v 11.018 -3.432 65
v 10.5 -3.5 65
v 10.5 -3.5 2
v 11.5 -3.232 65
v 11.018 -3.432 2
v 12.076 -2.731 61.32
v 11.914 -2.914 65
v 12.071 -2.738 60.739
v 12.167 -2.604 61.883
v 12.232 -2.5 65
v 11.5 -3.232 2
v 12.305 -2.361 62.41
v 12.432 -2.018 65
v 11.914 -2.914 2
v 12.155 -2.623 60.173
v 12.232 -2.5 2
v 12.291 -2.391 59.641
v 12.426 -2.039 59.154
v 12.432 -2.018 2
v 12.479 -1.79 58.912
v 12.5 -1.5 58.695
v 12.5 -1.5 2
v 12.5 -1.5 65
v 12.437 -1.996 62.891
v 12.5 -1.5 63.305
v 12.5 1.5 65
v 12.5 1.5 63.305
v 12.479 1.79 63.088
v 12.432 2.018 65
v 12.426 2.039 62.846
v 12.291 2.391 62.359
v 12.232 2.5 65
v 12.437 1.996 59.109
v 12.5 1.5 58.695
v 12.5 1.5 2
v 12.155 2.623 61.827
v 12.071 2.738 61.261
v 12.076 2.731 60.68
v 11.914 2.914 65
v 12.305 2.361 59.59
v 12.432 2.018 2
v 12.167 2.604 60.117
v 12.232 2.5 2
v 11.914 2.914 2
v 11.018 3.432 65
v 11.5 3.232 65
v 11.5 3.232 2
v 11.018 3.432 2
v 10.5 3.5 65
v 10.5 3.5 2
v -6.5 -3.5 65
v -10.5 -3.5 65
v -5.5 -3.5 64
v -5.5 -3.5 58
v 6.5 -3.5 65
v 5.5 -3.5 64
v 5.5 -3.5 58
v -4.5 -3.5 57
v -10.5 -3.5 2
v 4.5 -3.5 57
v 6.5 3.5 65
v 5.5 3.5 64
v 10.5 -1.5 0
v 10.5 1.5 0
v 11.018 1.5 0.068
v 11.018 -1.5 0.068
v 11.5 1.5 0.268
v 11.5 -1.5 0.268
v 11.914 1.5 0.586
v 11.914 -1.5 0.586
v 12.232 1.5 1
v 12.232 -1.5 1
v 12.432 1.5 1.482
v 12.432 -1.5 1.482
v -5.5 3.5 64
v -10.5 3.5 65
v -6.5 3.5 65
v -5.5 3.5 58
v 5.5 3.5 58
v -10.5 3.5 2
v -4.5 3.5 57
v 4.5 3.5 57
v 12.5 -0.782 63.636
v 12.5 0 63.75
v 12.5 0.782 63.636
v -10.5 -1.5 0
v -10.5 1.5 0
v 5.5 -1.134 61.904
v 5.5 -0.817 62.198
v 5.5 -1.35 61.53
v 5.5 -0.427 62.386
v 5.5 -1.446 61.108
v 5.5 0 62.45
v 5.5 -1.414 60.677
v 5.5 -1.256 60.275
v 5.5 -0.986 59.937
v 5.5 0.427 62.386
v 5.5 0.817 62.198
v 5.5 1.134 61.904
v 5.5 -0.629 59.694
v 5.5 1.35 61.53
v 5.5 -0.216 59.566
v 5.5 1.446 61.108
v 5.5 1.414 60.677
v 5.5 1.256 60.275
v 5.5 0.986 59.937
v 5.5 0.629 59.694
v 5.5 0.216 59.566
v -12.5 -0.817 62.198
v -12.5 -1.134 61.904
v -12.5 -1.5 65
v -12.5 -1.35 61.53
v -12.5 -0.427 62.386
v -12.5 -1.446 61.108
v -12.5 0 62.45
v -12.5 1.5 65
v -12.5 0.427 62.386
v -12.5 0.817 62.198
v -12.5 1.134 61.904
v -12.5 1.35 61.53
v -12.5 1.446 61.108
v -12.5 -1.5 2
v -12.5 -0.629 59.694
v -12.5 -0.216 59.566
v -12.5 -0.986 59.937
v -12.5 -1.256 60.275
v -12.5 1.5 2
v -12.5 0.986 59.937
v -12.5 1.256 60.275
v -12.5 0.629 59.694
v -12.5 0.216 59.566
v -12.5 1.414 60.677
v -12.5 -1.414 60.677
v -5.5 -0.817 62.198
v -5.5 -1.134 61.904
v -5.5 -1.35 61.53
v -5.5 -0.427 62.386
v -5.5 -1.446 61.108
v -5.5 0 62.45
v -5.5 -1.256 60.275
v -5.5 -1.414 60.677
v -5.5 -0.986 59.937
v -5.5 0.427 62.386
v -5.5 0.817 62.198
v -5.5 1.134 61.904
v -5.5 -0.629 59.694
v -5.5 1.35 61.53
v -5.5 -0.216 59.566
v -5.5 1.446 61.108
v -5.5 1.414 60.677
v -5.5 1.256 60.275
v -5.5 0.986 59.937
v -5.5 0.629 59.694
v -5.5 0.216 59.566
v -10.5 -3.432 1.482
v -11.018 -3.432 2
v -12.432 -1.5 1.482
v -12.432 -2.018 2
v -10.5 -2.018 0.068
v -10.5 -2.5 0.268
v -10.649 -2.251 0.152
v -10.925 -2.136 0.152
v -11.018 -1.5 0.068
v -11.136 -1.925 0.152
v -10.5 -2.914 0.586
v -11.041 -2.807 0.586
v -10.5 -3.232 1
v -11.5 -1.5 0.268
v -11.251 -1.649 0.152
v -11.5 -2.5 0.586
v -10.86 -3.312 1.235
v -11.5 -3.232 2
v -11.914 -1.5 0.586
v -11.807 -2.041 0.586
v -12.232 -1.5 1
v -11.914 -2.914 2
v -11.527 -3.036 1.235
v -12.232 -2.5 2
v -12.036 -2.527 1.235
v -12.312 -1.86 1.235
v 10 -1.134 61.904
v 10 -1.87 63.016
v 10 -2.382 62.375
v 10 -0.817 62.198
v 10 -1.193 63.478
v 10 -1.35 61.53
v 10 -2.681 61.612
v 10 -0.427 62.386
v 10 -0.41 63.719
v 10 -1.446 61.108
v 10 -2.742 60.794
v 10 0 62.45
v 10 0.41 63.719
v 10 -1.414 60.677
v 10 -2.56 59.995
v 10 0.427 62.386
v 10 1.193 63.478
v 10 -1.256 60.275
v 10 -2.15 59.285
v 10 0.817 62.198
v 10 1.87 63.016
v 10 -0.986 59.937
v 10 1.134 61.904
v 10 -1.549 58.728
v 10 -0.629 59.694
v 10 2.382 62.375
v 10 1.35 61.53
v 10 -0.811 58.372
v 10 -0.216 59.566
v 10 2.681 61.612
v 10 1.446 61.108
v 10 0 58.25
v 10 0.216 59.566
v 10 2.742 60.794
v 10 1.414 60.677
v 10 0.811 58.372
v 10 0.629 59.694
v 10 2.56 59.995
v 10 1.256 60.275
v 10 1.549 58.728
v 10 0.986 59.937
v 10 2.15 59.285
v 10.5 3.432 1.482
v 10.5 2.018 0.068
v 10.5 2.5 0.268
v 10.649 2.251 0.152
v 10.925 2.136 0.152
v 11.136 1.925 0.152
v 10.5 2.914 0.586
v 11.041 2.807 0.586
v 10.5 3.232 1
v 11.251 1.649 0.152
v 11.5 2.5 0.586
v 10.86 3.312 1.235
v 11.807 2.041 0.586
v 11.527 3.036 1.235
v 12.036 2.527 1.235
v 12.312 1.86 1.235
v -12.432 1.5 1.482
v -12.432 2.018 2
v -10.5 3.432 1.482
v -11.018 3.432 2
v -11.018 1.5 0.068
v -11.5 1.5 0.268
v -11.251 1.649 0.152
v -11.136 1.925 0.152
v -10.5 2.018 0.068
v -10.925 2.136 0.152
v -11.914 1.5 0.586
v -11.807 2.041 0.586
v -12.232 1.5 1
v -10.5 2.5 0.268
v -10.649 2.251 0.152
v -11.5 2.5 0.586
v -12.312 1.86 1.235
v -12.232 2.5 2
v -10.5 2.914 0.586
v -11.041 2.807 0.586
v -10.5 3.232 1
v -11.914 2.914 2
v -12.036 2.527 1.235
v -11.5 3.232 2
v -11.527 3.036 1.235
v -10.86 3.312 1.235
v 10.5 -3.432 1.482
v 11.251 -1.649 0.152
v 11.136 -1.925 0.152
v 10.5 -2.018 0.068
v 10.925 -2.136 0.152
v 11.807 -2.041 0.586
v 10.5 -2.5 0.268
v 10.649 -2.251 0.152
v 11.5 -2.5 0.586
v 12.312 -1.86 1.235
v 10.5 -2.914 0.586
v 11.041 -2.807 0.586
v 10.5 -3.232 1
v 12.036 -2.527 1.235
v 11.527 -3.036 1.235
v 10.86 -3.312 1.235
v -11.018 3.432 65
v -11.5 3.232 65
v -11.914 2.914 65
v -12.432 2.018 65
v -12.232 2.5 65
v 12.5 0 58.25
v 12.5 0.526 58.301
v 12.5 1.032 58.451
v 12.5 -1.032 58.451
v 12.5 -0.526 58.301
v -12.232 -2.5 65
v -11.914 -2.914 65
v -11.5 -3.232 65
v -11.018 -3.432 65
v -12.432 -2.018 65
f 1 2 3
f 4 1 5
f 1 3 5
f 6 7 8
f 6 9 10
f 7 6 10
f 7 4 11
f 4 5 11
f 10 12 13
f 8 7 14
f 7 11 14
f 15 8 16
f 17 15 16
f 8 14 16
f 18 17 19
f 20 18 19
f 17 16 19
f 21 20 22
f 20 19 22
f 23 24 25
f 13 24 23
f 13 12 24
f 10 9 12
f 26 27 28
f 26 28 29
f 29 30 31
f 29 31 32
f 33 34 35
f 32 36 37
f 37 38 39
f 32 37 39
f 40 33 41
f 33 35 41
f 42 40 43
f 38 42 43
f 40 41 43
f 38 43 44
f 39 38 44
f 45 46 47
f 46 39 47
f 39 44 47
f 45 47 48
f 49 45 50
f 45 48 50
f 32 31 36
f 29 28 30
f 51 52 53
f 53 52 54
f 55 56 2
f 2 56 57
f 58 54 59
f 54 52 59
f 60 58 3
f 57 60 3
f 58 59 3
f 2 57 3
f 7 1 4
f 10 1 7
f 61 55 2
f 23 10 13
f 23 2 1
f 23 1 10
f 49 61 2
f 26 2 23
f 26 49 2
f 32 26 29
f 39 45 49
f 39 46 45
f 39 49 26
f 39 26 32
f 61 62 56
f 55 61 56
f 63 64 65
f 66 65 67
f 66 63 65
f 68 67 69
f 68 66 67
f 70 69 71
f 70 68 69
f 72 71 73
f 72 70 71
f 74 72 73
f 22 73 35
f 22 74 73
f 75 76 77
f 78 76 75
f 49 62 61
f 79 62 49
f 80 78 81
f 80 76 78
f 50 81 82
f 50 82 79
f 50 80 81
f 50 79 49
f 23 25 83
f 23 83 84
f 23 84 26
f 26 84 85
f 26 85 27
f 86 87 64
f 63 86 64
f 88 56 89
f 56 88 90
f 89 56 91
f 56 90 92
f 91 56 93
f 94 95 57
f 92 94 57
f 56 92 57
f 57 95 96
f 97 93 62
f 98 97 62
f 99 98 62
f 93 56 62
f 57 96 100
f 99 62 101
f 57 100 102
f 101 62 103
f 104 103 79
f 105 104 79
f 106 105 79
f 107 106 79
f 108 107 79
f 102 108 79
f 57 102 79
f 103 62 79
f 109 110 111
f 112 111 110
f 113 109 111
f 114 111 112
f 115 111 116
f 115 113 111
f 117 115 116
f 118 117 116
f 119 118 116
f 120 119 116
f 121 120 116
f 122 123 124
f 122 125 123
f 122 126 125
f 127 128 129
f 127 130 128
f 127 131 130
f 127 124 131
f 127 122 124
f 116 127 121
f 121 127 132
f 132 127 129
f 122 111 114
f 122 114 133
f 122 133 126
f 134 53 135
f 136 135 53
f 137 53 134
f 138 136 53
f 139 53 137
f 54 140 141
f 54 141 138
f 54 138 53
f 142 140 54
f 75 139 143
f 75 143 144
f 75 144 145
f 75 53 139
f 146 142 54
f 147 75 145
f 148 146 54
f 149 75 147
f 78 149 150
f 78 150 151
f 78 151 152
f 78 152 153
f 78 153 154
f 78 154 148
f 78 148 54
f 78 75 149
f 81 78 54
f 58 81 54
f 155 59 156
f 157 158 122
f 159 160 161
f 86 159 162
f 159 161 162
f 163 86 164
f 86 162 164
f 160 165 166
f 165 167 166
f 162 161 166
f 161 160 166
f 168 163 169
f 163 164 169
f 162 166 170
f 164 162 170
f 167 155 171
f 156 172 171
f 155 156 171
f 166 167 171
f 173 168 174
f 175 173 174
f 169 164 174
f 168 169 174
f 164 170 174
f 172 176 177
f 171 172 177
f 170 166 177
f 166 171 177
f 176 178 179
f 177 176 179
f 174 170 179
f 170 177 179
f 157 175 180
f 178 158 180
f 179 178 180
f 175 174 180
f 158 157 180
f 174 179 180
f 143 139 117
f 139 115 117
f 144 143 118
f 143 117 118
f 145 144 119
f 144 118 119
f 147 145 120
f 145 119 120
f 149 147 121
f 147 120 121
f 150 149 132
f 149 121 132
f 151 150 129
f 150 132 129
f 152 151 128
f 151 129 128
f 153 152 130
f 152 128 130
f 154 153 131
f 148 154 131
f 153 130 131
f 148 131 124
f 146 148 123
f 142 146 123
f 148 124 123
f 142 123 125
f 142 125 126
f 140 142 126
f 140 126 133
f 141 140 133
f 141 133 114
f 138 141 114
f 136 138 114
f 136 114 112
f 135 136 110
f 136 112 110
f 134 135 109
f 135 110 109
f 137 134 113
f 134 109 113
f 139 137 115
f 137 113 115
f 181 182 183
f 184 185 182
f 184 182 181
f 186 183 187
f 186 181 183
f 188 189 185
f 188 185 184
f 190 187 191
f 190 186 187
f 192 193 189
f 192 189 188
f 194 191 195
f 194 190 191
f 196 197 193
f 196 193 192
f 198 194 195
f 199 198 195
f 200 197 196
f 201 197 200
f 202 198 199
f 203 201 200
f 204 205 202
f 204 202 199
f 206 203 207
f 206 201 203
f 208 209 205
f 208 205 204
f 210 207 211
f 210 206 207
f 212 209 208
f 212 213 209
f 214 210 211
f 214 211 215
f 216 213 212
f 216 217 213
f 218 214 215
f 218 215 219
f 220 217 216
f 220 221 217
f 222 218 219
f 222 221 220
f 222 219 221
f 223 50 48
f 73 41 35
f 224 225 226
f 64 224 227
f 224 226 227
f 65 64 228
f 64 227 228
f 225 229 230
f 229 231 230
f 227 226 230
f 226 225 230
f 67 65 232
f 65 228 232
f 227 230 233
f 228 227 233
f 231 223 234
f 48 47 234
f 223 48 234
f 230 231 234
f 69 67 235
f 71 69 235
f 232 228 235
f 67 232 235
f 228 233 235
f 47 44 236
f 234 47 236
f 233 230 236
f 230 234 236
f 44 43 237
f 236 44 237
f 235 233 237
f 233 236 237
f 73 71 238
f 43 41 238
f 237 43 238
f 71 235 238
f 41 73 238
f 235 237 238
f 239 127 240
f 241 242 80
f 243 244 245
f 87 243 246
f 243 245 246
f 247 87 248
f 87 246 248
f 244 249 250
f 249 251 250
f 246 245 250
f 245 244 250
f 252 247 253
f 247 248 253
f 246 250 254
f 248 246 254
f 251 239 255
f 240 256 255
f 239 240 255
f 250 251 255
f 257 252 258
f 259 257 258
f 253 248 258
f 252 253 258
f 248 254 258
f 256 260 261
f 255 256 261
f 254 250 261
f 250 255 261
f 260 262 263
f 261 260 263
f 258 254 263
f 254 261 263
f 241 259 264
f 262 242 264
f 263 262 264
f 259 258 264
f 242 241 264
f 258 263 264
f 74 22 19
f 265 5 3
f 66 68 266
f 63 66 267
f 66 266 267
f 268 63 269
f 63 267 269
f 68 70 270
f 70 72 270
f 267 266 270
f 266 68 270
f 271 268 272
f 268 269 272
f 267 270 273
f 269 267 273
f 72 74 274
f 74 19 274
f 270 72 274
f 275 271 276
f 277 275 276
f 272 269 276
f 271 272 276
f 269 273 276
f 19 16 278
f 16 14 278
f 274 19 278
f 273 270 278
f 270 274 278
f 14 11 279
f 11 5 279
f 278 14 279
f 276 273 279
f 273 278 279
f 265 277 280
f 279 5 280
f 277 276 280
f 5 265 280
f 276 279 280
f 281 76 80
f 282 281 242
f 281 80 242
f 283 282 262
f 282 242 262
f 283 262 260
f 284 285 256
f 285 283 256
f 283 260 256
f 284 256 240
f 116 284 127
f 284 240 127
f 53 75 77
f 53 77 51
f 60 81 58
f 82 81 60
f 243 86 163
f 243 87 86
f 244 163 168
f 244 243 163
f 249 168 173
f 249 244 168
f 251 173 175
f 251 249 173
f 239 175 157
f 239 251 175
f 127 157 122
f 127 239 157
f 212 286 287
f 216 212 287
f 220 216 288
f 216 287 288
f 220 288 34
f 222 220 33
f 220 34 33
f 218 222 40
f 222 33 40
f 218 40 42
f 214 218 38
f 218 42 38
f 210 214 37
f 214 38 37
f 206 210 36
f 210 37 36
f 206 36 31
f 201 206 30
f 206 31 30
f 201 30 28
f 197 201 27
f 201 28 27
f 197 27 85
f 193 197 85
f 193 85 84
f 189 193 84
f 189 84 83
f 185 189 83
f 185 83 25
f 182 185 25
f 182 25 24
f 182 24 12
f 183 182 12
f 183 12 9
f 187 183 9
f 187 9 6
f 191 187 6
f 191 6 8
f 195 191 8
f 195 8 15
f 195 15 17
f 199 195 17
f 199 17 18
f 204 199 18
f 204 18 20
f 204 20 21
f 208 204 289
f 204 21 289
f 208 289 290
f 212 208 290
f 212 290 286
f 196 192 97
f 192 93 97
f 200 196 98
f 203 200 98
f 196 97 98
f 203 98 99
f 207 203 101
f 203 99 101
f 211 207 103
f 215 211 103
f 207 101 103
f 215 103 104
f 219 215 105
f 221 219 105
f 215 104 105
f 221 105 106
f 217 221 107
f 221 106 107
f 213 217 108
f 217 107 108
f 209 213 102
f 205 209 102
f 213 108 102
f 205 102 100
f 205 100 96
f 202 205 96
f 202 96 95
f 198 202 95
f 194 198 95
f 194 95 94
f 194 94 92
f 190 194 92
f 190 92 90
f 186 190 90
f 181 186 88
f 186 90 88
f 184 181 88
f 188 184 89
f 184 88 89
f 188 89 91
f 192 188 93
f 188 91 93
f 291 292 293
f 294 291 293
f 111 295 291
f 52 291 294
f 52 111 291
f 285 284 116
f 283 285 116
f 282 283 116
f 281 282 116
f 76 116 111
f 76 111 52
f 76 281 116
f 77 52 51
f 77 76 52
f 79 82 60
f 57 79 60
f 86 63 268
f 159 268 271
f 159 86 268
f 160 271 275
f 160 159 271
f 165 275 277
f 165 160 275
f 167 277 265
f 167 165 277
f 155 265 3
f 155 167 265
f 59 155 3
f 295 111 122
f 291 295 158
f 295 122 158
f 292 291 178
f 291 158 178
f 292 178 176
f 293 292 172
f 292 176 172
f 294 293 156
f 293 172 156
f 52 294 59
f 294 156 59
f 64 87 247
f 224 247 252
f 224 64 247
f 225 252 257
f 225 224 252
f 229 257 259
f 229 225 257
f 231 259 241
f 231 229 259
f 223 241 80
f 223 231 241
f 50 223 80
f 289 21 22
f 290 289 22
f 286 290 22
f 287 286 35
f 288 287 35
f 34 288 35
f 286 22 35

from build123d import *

# Parameters (mm, degrees)
SKETCH1_W                        = 25
SKETCH1_H                        = 7
BOSS_EXTRUDE1_DEPTH              = 65
SKETCH2_W                        = 11
SKETCH2_H                        = 8
CUT_EXTRUDE1_DEPTH               = 67.560123197
CHAMFER1_SIZE                    = 1
CBORE_FOR_M2_5_SHCS2_D           = 2.9
CBORE_FOR_M2_5_SHCS2_CBORE_D     = 5.5
CBORE_FOR_M2_5_SHCS2_CBORE_DEPTH = 2.5
FILLET1_R                        = 2
FILLET2_R                        = 2
CHAMFER2_SIZE                    = 1


with BuildPart() as part:
    # Sketch1 → Boss-Extrude1 (new body)
    with BuildSketch(Plane.XY):
        Rectangle(SKETCH1_W, SKETCH1_H)
    extrude(amount=BOSS_EXTRUDE1_DEPTH)

    # Sketch2 → Cut-Extrude1 (cut, through all)
    with BuildSketch(Plane(origin=(0, 3.5, 0), x_dir=(1, 0, 0), z_dir=(0, 1, 0))):
        with Locations((0, -61)):
            Rectangle(SKETCH2_W, SKETCH2_H)
    extrude(amount=-CUT_EXTRUDE1_DEPTH, mode=Mode.SUBTRACT)

    # Chamfer1
    chamfer1_edges = [part.edges().sort_by_distance(p)[0] for p in [
        (-5.5, 0, 57),
        (5.5, 0, 57),
    ]]
    chamfer(chamfer1_edges, length=CHAMFER1_SIZE)

    # CBORE for M2.5 SHCS2 (through all)
    with Locations(Plane(origin=(12.5, -6.575007997, 116.706532938), x_dir=(0, 0, -1), z_dir=(1, 0, 0))):
        with Locations((55.706532938, 6.575007997)):
            CounterBoreHole(CBORE_FOR_M2_5_SHCS2_D / 2, CBORE_FOR_M2_5_SHCS2_CBORE_D / 2, CBORE_FOR_M2_5_SHCS2_CBORE_DEPTH)

    # Fillet1
    # the kernel refuses this fillet: 2 mm, written as the material it takes off along each edge
    with BuildSketch(Plane(origin=(12.5, -3.5, -5), x_dir=(-1, 0, 0), z_dir=(0, 0, 1)), Plane(origin=(12.5, 3.5, -5), x_dir=(0, -1, 0), z_dir=(0, 0, 1))) as fillet1_piece_1:
        with BuildLine():
            CenterArc((FILLET1_R, -FILLET1_R), FILLET1_R, 90, 90)
            Line((0, -FILLET1_R), (0, 0))
            Line((0, 0), (FILLET1_R, 0))
        make_face()
    extrude(amount=75, mode=Mode.SUBTRACT)
    with BuildSketch(Plane(origin=(-12.5, -3.5, -5), x_dir=(1, 0, 0), z_dir=(0, 0, 1)), Plane(origin=(-12.5, 3.5, -5), x_dir=(0, -1, 0), z_dir=(0, 0, 1))) as fillet1_piece_2:
        with BuildLine():
            CenterArc((FILLET1_R, FILLET1_R), FILLET1_R, 180, 90)
            Line((0, FILLET1_R), (0, 0))
            Line((0, 0), (FILLET1_R, 0))
        make_face()
    extrude(amount=75, mode=Mode.SUBTRACT)

    # Fillet2
    fillet2_edges = [part.edges().sort_by_distance(p)[0] for p in [
        (-12.5, 0, 0),
        (12.5, 0, 0),
        (0, -3.5, 0),
        (0, 3.5, 0),
        (11.914213562, -2.914213562, 0),
        (-11.914213562, -2.914213562, 0),
        (11.914213562, 2.914213562, 0),
        (-11.914213562, 2.914213562, 0),
    ]]
    fillet(fillet2_edges, radius=FILLET2_R)

    # Chamfer2
    chamfer2_edges = [part.edges().sort_by_distance(p)[0] for p in [
        (-5.5, 0, 65),
        (5.5, 0, 65),
    ]]
    chamfer(chamfer2_edges, length=CHAMFER2_SIZE)


solid = part.part
